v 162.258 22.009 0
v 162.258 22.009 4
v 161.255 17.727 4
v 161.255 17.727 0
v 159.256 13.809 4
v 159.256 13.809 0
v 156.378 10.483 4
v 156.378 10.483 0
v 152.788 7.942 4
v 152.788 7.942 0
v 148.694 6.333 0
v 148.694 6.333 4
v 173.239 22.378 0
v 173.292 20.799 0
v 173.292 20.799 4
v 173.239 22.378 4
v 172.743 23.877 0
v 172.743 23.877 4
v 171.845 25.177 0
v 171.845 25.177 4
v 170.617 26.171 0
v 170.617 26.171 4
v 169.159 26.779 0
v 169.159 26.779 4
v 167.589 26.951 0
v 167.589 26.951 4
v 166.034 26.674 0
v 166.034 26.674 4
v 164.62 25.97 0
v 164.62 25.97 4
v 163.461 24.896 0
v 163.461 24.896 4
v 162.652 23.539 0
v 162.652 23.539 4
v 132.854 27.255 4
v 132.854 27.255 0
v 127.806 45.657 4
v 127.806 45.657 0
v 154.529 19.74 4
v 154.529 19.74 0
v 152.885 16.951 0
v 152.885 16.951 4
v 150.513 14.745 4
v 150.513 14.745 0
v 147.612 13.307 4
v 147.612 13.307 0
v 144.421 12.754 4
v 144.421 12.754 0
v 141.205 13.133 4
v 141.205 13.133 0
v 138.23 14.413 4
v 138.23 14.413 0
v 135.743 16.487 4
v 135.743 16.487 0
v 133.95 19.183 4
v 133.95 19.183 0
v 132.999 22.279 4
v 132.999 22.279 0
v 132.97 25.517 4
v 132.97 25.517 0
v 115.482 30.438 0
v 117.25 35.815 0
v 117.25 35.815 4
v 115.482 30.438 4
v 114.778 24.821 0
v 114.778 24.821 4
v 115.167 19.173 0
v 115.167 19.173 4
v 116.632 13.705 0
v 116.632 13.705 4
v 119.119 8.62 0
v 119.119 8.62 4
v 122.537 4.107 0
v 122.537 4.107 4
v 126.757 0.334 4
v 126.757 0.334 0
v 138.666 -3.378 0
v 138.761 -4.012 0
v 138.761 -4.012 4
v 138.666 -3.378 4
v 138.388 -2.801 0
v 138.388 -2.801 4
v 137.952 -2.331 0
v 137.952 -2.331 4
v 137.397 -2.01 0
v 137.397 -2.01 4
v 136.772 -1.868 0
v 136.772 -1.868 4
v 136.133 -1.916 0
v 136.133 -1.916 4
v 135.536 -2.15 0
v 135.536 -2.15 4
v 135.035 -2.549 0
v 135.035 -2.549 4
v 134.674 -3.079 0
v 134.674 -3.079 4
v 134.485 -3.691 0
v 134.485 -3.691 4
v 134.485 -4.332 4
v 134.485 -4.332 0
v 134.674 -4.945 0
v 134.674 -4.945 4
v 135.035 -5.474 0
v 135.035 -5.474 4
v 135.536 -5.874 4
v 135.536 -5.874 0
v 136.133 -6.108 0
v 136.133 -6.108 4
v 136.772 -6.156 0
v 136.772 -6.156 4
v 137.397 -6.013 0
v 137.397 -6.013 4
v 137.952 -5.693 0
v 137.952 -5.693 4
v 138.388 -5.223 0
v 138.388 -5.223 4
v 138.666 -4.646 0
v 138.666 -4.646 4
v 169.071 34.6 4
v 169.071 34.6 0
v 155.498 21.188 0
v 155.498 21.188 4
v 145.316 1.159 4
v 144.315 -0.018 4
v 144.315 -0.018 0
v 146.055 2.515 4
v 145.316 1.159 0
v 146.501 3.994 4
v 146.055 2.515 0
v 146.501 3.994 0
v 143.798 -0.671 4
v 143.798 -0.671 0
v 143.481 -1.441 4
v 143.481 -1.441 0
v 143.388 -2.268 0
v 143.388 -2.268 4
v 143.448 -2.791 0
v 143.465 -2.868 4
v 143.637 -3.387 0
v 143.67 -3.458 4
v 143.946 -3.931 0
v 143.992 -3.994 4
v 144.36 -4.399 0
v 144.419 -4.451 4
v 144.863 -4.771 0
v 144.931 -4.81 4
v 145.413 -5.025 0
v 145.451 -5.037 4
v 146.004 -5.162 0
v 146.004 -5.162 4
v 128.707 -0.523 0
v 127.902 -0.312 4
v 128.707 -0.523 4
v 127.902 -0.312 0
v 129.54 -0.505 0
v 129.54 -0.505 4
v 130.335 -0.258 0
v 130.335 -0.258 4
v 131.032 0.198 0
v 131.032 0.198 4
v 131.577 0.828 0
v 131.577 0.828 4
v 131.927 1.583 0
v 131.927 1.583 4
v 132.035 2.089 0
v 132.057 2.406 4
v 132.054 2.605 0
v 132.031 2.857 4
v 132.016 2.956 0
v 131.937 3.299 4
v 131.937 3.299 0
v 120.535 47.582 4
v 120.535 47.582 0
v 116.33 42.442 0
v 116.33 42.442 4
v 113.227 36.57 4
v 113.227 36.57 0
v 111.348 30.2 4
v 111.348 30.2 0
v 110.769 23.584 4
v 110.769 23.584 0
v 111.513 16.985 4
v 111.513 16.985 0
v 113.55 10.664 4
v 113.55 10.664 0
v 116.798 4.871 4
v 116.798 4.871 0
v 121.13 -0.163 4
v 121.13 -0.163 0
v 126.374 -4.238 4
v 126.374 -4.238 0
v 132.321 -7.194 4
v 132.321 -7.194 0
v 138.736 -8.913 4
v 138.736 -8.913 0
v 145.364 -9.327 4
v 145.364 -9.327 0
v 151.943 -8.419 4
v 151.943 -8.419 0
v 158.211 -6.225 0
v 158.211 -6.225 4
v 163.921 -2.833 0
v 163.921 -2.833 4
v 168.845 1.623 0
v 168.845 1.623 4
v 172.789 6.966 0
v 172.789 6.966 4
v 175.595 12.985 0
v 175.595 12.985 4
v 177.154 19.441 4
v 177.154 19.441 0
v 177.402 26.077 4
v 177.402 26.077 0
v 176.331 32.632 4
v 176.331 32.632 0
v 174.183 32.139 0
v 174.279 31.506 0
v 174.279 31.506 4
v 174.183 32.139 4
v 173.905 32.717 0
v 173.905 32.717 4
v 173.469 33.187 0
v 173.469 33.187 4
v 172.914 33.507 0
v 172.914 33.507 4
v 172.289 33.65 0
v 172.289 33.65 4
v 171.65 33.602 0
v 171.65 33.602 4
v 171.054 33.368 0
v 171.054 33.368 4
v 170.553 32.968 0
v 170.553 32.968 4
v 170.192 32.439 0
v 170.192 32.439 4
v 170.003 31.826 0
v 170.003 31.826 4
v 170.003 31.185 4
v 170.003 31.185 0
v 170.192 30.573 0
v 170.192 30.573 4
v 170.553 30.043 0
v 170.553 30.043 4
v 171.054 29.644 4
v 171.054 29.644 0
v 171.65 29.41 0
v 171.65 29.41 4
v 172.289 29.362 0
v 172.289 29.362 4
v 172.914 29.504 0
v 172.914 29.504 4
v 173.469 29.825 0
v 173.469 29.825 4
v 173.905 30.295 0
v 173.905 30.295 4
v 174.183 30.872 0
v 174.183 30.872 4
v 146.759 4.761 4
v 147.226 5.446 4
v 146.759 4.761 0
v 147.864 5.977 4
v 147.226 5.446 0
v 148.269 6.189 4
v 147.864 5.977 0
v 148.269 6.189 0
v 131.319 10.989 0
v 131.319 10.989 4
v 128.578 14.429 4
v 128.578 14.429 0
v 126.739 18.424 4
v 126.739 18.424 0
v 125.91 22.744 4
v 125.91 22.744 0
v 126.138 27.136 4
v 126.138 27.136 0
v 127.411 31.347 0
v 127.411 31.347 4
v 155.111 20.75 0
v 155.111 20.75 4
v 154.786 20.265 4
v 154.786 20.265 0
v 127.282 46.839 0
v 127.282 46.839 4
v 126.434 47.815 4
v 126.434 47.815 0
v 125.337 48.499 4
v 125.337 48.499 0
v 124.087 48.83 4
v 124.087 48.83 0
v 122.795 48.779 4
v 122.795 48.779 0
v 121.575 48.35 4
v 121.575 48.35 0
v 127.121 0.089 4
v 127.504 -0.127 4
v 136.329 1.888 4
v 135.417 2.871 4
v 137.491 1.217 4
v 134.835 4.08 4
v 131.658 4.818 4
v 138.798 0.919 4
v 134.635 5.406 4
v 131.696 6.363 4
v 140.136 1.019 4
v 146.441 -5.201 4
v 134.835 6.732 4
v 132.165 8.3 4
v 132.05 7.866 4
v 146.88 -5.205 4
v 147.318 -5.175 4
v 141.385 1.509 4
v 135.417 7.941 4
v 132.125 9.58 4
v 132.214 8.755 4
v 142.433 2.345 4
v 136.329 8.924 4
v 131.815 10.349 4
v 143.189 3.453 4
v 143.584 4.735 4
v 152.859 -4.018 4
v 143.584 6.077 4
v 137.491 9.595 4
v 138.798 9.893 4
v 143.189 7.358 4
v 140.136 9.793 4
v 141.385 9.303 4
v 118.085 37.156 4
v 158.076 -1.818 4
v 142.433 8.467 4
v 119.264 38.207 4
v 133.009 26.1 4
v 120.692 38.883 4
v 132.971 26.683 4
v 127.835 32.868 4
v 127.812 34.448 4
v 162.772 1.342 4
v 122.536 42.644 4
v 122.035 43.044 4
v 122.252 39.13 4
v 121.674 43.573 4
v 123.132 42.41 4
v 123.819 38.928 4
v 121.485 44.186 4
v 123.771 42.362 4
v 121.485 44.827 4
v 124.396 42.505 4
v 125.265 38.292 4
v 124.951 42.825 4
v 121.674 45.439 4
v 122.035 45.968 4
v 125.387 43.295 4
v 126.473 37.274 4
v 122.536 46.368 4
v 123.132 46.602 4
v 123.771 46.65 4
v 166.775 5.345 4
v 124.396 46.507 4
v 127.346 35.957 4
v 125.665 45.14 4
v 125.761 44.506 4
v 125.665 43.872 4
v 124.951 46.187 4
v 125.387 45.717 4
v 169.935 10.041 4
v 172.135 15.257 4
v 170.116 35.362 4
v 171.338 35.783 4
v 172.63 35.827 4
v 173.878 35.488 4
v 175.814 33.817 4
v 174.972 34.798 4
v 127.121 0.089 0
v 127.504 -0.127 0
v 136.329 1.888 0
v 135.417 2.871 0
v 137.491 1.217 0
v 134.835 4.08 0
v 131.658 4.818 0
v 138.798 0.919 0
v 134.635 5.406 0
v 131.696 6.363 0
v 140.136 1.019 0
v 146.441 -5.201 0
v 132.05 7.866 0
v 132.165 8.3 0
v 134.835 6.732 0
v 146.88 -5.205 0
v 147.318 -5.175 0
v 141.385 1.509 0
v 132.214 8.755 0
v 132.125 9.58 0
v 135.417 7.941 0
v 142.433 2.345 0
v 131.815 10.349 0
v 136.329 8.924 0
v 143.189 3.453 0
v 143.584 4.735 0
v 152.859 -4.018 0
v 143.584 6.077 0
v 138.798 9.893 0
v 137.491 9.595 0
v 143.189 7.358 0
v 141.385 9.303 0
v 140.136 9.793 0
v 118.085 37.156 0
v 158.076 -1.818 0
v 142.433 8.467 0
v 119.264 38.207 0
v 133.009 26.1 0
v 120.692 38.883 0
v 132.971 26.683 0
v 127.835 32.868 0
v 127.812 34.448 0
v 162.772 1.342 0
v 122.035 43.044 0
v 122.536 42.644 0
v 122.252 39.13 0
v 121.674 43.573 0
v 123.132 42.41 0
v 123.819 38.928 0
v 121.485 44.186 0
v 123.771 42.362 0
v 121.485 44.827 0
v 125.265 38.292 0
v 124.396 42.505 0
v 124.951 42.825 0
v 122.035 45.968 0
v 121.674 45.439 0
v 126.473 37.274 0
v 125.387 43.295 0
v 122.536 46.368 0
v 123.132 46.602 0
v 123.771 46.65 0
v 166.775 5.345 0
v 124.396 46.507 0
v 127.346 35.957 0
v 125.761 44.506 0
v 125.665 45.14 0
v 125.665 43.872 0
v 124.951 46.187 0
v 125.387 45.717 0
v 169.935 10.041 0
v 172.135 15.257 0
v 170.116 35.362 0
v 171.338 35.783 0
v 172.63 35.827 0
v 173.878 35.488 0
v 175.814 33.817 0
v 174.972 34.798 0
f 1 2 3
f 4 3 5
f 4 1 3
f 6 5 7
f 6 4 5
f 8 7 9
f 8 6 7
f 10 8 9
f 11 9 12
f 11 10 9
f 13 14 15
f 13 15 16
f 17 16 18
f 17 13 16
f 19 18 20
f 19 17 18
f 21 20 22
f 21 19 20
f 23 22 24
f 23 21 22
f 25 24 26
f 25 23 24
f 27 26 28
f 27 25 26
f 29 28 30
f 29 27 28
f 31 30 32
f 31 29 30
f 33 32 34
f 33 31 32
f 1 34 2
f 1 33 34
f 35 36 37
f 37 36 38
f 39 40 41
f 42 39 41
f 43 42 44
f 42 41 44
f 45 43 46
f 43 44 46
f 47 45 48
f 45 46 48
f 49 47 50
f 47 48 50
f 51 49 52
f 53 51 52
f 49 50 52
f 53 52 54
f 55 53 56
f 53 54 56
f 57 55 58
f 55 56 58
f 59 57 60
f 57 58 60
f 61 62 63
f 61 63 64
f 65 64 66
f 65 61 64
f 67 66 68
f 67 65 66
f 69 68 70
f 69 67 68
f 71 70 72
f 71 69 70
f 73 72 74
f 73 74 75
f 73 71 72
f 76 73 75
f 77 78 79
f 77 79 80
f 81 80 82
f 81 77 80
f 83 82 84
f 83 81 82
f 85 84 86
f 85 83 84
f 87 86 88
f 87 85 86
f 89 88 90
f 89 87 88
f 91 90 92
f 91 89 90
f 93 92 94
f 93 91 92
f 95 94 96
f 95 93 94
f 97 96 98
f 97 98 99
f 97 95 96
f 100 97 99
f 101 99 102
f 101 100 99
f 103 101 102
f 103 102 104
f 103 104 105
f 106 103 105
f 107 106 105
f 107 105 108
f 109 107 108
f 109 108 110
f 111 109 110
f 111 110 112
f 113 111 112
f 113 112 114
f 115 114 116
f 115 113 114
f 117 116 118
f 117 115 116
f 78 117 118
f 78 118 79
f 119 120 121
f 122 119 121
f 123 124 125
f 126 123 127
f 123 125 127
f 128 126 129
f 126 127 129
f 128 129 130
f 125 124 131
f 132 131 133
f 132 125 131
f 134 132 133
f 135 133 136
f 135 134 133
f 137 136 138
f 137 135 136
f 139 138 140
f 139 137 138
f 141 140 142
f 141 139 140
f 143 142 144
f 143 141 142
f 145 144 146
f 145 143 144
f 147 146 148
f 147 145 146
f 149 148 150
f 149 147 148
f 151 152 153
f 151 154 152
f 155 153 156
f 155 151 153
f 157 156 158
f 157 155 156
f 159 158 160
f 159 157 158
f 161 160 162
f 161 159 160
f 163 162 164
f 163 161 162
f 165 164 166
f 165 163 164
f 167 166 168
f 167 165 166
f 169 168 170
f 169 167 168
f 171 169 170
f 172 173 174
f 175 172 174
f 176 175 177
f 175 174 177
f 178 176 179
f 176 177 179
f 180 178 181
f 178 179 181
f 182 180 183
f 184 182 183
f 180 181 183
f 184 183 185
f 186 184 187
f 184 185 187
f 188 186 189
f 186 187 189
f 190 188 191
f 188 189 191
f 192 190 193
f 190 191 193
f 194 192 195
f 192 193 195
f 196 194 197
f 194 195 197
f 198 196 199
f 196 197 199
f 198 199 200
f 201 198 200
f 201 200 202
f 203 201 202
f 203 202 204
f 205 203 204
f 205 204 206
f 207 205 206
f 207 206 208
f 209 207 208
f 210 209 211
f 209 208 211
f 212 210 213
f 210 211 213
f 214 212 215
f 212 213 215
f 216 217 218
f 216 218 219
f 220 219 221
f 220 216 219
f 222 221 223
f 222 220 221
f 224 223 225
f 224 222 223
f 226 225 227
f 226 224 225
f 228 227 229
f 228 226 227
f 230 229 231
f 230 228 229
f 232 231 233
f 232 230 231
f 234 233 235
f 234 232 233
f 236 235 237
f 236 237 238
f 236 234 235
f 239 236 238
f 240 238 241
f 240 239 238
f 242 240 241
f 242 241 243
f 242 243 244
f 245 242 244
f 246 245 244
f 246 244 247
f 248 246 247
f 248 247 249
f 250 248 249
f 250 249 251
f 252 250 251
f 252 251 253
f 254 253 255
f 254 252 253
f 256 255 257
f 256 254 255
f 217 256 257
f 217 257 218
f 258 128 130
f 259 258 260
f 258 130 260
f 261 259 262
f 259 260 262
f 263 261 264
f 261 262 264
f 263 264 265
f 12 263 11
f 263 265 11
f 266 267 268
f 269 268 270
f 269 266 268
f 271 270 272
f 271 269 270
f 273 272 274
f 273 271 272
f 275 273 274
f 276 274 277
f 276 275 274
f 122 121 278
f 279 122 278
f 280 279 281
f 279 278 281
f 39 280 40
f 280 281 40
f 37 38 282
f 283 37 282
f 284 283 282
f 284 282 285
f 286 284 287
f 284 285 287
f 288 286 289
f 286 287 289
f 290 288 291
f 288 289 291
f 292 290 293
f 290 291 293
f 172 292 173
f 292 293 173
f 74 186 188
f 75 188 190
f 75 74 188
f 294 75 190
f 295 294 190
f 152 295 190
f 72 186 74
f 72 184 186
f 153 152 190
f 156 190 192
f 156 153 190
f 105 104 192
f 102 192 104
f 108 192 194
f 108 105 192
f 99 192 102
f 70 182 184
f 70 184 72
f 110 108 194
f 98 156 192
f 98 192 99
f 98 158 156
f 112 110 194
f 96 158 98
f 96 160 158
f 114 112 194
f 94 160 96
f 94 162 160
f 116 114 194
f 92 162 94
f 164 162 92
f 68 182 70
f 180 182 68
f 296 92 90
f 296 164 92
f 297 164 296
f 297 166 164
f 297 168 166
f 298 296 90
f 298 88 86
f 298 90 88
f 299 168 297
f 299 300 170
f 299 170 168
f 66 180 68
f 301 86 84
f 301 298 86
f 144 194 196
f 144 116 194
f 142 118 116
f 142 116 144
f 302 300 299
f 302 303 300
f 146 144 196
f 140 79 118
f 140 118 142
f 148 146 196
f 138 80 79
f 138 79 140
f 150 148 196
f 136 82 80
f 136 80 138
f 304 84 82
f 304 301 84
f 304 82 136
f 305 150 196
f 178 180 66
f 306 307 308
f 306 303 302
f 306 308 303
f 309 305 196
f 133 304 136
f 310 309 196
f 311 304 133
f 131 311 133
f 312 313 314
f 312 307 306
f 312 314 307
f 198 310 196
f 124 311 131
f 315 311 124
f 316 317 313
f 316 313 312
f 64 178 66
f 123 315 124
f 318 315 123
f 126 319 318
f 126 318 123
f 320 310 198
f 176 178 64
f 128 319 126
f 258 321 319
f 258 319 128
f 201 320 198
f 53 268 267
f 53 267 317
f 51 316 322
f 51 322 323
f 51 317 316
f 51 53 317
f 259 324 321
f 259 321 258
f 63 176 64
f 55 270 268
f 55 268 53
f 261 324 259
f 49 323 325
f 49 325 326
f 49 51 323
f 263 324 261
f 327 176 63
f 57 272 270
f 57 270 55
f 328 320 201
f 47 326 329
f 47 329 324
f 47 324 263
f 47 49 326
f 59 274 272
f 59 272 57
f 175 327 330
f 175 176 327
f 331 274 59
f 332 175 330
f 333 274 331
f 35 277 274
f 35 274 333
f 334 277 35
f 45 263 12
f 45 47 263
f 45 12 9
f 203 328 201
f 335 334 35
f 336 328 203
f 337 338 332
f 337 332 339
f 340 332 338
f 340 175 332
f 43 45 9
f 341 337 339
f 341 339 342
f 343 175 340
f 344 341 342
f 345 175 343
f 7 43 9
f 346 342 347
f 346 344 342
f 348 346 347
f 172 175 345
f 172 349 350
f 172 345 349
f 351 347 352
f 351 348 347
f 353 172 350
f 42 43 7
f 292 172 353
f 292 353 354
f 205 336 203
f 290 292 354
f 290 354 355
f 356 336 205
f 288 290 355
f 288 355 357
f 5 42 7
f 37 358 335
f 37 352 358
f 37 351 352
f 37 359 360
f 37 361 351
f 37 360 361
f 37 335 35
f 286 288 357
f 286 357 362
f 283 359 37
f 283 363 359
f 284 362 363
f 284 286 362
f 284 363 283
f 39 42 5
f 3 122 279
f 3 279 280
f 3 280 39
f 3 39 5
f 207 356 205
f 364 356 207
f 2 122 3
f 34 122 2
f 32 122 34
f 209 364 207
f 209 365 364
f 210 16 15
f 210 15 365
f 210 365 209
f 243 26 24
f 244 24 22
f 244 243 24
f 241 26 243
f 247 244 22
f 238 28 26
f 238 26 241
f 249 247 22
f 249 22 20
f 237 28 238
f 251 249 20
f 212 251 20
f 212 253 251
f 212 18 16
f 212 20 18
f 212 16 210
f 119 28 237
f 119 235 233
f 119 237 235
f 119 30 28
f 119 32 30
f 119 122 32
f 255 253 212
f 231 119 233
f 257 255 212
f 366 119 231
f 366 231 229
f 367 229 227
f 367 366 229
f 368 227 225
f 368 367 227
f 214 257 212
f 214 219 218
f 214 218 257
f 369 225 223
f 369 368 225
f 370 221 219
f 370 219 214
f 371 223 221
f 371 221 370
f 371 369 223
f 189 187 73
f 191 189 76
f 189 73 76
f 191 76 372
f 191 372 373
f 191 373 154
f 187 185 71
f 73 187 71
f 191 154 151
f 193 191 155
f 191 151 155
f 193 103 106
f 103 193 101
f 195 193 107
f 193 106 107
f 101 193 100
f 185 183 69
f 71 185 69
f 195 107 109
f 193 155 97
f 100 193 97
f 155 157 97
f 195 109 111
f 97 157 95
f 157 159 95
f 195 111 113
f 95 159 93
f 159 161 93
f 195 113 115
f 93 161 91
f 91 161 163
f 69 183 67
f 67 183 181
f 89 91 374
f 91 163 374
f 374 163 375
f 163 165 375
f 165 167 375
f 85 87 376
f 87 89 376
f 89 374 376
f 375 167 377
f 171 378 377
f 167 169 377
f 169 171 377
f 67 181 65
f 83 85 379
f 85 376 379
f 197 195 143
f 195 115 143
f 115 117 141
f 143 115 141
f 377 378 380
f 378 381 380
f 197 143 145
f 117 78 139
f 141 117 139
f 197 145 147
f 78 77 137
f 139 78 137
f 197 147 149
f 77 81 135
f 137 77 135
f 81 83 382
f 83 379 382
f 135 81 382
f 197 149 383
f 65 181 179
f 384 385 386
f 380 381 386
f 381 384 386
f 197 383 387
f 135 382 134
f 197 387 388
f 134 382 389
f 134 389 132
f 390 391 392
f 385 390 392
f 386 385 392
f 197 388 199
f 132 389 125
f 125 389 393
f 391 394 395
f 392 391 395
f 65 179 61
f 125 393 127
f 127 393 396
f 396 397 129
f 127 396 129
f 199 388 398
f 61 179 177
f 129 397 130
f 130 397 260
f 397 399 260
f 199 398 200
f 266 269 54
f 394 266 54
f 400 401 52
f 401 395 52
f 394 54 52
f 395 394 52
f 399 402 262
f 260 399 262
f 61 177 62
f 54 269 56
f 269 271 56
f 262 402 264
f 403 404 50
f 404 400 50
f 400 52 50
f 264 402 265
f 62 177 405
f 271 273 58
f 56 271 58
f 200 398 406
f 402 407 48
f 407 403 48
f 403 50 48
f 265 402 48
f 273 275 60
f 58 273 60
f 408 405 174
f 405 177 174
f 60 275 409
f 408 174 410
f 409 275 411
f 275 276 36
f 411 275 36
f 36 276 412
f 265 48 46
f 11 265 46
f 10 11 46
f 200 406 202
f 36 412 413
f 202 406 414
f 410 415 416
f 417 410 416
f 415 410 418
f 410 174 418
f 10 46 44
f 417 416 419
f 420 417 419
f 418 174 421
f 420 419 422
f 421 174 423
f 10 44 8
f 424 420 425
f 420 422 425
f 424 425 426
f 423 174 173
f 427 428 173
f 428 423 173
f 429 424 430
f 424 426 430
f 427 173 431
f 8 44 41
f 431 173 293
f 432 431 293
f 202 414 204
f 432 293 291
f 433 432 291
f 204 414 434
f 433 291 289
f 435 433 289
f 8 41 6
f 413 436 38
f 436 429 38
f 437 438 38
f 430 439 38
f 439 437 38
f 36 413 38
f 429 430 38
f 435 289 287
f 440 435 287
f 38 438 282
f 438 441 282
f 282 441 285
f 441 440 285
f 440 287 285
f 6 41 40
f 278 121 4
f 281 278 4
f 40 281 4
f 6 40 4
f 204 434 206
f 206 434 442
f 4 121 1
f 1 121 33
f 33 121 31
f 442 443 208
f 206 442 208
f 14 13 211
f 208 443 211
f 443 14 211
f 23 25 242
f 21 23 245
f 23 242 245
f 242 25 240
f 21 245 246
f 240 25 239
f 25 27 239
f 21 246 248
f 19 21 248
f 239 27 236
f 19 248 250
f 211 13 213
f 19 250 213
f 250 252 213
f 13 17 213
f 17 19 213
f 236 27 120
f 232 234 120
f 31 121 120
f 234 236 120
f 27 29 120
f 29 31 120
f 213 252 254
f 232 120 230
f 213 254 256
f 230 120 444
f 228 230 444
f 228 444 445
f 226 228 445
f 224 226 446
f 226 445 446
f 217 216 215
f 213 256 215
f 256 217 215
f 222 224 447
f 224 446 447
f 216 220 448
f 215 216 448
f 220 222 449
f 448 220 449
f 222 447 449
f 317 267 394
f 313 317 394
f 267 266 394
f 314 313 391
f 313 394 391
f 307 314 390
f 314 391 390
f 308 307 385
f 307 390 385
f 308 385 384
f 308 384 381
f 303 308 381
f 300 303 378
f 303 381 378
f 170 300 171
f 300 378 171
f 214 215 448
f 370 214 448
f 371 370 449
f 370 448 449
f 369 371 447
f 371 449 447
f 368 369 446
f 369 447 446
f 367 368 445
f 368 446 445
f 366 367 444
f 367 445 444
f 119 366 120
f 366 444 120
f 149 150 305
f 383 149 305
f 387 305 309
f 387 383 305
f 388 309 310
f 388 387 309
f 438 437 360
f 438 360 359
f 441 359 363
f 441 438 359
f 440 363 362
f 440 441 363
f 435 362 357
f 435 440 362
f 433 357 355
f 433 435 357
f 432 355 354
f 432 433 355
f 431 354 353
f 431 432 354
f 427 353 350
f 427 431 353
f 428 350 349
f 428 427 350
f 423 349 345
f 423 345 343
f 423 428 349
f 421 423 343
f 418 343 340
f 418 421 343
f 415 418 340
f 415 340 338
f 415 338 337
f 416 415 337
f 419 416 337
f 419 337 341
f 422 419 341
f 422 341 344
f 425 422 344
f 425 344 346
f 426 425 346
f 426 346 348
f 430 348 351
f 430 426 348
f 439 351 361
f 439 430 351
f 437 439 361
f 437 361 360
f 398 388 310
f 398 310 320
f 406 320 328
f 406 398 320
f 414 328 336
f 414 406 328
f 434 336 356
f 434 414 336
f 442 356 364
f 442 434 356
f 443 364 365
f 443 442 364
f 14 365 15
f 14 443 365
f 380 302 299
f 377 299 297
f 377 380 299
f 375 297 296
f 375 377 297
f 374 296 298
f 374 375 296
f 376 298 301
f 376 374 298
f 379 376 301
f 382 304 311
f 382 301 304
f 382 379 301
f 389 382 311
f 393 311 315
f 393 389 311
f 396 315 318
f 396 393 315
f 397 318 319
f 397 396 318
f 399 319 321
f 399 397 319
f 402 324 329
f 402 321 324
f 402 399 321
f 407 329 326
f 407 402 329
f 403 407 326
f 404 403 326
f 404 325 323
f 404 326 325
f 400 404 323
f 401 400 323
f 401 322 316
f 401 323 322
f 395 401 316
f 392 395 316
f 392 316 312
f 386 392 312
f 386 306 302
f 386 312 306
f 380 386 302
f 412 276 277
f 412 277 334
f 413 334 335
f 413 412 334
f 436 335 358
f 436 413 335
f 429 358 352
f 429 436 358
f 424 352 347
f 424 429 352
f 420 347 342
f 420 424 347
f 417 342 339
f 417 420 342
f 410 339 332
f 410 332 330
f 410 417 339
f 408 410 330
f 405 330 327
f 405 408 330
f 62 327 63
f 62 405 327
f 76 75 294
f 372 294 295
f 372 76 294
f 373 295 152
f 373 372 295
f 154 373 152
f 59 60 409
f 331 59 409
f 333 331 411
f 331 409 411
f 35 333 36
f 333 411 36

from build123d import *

# Parameters (mm, degrees)
SKETCH1_R           = 2.15
BOSS_EXTRUDE1_DEPTH = 4
SKETCH2_R           = 4.5
CUT_EXTRUDE1_DEPTH  = 10
BOSS_EXTRUDE2_START = -4
SKETCH3_R           = 7.5
SKETCH3_R_2         = 4.5
BOSS_EXTRUDE2_DEPTH = 4
FILLET1_R           = 3


with BuildPart() as part:
    # Sketch1 → Boss-Extrude1 (new body)
    with BuildSketch(Plane.XY):
        with BuildLine():
            Line((169.071208826, 34.599951739), (155.49789847, 21.187541922))
            ThreePointArc((155.49789847, 21.187541922), (154.94043739, 20.512931345), (154.52928773, 19.740391219))
            ThreePointArc((154.52928773, 19.740391219), (141.205165824, 13.133334454), (132.969666153, 25.51727441))
            ThreePointArc((132.969666153, 25.51727441), (132.999870165, 26.391888614), (132.854399997, 27.254849052))
            Line((132.854399997, 27.254849052), (127.805773323, 45.656991858))
            ThreePointArc((127.805773323, 45.656991858), (124.72411503, 48.711211723), (120.534868929, 47.582011153))
            ThreePointArc((120.534868929, 47.582011153), (135.485264927, -8.213626307), (176.330506388, 32.631615154))
            ThreePointArc((176.330506388, 32.631615154), (173.267113127, 35.704154585), (169.071208826, 34.599951739))
        make_face()
        with Locations((123.610783427, 44.506096654)):
            Circle(SKETCH1_R, mode=Mode.SUBTRACT)
        with Locations((172.128729044, 31.505752308)):
            Circle(SKETCH1_R, mode=Mode.SUBTRACT)
        with Locations((136.611127773, -4.011848962)):
            Circle(SKETCH1_R, mode=Mode.SUBTRACT)
        with BuildLine():
            ThreePointArc((127.410923425, 31.346666741), (124.564673615, 38.661300157), (117.250040198, 35.815050347))
            ThreePointArc((117.250040198, 35.815050347), (115.76695708, 16.403661026), (126.757039397, 0.334446311))
            ThreePointArc((126.757039397, 0.334446311), (134.51482266, 1.526838378), (133.322430592, 9.284621641))
            ThreePointArc((133.322430592, 9.284621641), (126.488733751, 19.276552427), (127.410923425, 31.346666741))
        make_face(mode=Mode.SUBTRACT)
        with BuildLine():
            ThreePointArc((173.291771113, 20.798713806), (168.38023766, 26.920955155), (162.25799631, 22.009421702))
            ThreePointArc((162.25799631, 22.009421702), (157.021578838, 11.095301243), (146.107458379, 5.858883771))
            ThreePointArc((146.107458379, 5.858883771), (141.195924926, -0.263357578), (147.318166275, -5.174891032))
            ThreePointArc((147.318166275, -5.174891032), (164.870464109, 3.246415972), (173.291771113, 20.798713806))
        make_face(mode=Mode.SUBTRACT)
    extrude(amount=BOSS_EXTRUDE1_DEPTH)

    # Sketch2 → Cut-Extrude1 (cut)
    with BuildSketch(Plane(origin=(0, 0, 0), x_dir=(-1, 0, 0), z_dir=(0, 0, -1))):
        with Locations((-139.134613463, 5.405927844)):
            Circle(SKETCH2_R)
    extrude(amount=-CUT_EXTRUDE1_DEPTH, mode=Mode.SUBTRACT)

    # Sketch3 → Boss-Extrude2 (add)
    with BuildSketch(Plane.XY.offset(4).offset(BOSS_EXTRUDE2_START)):
        with Locations((139.134613463, 5.405927844)):
            Circle(SKETCH3_R)
        with Locations(Location((139.134613463, 5.405927844, 0), (0, 0, 180))):
            Circle(SKETCH3_R_2, mode=Mode.SUBTRACT)
    extrude(amount=BOSS_EXTRUDE2_DEPTH)

    # Fillet1
    fillet1_edges = [part.edges().sort_by_distance(p)[0] for p in [
        (133.49265497, 0.464439772, 2),
        (141.549948809, -1.694505605, 2),
        (146.616834445, 5.922037499, 2),
        (132.912874843, 9.594002408, 2),
    ]]
    fillet(fillet1_edges, radius=FILLET1_R)


solid = part.part
